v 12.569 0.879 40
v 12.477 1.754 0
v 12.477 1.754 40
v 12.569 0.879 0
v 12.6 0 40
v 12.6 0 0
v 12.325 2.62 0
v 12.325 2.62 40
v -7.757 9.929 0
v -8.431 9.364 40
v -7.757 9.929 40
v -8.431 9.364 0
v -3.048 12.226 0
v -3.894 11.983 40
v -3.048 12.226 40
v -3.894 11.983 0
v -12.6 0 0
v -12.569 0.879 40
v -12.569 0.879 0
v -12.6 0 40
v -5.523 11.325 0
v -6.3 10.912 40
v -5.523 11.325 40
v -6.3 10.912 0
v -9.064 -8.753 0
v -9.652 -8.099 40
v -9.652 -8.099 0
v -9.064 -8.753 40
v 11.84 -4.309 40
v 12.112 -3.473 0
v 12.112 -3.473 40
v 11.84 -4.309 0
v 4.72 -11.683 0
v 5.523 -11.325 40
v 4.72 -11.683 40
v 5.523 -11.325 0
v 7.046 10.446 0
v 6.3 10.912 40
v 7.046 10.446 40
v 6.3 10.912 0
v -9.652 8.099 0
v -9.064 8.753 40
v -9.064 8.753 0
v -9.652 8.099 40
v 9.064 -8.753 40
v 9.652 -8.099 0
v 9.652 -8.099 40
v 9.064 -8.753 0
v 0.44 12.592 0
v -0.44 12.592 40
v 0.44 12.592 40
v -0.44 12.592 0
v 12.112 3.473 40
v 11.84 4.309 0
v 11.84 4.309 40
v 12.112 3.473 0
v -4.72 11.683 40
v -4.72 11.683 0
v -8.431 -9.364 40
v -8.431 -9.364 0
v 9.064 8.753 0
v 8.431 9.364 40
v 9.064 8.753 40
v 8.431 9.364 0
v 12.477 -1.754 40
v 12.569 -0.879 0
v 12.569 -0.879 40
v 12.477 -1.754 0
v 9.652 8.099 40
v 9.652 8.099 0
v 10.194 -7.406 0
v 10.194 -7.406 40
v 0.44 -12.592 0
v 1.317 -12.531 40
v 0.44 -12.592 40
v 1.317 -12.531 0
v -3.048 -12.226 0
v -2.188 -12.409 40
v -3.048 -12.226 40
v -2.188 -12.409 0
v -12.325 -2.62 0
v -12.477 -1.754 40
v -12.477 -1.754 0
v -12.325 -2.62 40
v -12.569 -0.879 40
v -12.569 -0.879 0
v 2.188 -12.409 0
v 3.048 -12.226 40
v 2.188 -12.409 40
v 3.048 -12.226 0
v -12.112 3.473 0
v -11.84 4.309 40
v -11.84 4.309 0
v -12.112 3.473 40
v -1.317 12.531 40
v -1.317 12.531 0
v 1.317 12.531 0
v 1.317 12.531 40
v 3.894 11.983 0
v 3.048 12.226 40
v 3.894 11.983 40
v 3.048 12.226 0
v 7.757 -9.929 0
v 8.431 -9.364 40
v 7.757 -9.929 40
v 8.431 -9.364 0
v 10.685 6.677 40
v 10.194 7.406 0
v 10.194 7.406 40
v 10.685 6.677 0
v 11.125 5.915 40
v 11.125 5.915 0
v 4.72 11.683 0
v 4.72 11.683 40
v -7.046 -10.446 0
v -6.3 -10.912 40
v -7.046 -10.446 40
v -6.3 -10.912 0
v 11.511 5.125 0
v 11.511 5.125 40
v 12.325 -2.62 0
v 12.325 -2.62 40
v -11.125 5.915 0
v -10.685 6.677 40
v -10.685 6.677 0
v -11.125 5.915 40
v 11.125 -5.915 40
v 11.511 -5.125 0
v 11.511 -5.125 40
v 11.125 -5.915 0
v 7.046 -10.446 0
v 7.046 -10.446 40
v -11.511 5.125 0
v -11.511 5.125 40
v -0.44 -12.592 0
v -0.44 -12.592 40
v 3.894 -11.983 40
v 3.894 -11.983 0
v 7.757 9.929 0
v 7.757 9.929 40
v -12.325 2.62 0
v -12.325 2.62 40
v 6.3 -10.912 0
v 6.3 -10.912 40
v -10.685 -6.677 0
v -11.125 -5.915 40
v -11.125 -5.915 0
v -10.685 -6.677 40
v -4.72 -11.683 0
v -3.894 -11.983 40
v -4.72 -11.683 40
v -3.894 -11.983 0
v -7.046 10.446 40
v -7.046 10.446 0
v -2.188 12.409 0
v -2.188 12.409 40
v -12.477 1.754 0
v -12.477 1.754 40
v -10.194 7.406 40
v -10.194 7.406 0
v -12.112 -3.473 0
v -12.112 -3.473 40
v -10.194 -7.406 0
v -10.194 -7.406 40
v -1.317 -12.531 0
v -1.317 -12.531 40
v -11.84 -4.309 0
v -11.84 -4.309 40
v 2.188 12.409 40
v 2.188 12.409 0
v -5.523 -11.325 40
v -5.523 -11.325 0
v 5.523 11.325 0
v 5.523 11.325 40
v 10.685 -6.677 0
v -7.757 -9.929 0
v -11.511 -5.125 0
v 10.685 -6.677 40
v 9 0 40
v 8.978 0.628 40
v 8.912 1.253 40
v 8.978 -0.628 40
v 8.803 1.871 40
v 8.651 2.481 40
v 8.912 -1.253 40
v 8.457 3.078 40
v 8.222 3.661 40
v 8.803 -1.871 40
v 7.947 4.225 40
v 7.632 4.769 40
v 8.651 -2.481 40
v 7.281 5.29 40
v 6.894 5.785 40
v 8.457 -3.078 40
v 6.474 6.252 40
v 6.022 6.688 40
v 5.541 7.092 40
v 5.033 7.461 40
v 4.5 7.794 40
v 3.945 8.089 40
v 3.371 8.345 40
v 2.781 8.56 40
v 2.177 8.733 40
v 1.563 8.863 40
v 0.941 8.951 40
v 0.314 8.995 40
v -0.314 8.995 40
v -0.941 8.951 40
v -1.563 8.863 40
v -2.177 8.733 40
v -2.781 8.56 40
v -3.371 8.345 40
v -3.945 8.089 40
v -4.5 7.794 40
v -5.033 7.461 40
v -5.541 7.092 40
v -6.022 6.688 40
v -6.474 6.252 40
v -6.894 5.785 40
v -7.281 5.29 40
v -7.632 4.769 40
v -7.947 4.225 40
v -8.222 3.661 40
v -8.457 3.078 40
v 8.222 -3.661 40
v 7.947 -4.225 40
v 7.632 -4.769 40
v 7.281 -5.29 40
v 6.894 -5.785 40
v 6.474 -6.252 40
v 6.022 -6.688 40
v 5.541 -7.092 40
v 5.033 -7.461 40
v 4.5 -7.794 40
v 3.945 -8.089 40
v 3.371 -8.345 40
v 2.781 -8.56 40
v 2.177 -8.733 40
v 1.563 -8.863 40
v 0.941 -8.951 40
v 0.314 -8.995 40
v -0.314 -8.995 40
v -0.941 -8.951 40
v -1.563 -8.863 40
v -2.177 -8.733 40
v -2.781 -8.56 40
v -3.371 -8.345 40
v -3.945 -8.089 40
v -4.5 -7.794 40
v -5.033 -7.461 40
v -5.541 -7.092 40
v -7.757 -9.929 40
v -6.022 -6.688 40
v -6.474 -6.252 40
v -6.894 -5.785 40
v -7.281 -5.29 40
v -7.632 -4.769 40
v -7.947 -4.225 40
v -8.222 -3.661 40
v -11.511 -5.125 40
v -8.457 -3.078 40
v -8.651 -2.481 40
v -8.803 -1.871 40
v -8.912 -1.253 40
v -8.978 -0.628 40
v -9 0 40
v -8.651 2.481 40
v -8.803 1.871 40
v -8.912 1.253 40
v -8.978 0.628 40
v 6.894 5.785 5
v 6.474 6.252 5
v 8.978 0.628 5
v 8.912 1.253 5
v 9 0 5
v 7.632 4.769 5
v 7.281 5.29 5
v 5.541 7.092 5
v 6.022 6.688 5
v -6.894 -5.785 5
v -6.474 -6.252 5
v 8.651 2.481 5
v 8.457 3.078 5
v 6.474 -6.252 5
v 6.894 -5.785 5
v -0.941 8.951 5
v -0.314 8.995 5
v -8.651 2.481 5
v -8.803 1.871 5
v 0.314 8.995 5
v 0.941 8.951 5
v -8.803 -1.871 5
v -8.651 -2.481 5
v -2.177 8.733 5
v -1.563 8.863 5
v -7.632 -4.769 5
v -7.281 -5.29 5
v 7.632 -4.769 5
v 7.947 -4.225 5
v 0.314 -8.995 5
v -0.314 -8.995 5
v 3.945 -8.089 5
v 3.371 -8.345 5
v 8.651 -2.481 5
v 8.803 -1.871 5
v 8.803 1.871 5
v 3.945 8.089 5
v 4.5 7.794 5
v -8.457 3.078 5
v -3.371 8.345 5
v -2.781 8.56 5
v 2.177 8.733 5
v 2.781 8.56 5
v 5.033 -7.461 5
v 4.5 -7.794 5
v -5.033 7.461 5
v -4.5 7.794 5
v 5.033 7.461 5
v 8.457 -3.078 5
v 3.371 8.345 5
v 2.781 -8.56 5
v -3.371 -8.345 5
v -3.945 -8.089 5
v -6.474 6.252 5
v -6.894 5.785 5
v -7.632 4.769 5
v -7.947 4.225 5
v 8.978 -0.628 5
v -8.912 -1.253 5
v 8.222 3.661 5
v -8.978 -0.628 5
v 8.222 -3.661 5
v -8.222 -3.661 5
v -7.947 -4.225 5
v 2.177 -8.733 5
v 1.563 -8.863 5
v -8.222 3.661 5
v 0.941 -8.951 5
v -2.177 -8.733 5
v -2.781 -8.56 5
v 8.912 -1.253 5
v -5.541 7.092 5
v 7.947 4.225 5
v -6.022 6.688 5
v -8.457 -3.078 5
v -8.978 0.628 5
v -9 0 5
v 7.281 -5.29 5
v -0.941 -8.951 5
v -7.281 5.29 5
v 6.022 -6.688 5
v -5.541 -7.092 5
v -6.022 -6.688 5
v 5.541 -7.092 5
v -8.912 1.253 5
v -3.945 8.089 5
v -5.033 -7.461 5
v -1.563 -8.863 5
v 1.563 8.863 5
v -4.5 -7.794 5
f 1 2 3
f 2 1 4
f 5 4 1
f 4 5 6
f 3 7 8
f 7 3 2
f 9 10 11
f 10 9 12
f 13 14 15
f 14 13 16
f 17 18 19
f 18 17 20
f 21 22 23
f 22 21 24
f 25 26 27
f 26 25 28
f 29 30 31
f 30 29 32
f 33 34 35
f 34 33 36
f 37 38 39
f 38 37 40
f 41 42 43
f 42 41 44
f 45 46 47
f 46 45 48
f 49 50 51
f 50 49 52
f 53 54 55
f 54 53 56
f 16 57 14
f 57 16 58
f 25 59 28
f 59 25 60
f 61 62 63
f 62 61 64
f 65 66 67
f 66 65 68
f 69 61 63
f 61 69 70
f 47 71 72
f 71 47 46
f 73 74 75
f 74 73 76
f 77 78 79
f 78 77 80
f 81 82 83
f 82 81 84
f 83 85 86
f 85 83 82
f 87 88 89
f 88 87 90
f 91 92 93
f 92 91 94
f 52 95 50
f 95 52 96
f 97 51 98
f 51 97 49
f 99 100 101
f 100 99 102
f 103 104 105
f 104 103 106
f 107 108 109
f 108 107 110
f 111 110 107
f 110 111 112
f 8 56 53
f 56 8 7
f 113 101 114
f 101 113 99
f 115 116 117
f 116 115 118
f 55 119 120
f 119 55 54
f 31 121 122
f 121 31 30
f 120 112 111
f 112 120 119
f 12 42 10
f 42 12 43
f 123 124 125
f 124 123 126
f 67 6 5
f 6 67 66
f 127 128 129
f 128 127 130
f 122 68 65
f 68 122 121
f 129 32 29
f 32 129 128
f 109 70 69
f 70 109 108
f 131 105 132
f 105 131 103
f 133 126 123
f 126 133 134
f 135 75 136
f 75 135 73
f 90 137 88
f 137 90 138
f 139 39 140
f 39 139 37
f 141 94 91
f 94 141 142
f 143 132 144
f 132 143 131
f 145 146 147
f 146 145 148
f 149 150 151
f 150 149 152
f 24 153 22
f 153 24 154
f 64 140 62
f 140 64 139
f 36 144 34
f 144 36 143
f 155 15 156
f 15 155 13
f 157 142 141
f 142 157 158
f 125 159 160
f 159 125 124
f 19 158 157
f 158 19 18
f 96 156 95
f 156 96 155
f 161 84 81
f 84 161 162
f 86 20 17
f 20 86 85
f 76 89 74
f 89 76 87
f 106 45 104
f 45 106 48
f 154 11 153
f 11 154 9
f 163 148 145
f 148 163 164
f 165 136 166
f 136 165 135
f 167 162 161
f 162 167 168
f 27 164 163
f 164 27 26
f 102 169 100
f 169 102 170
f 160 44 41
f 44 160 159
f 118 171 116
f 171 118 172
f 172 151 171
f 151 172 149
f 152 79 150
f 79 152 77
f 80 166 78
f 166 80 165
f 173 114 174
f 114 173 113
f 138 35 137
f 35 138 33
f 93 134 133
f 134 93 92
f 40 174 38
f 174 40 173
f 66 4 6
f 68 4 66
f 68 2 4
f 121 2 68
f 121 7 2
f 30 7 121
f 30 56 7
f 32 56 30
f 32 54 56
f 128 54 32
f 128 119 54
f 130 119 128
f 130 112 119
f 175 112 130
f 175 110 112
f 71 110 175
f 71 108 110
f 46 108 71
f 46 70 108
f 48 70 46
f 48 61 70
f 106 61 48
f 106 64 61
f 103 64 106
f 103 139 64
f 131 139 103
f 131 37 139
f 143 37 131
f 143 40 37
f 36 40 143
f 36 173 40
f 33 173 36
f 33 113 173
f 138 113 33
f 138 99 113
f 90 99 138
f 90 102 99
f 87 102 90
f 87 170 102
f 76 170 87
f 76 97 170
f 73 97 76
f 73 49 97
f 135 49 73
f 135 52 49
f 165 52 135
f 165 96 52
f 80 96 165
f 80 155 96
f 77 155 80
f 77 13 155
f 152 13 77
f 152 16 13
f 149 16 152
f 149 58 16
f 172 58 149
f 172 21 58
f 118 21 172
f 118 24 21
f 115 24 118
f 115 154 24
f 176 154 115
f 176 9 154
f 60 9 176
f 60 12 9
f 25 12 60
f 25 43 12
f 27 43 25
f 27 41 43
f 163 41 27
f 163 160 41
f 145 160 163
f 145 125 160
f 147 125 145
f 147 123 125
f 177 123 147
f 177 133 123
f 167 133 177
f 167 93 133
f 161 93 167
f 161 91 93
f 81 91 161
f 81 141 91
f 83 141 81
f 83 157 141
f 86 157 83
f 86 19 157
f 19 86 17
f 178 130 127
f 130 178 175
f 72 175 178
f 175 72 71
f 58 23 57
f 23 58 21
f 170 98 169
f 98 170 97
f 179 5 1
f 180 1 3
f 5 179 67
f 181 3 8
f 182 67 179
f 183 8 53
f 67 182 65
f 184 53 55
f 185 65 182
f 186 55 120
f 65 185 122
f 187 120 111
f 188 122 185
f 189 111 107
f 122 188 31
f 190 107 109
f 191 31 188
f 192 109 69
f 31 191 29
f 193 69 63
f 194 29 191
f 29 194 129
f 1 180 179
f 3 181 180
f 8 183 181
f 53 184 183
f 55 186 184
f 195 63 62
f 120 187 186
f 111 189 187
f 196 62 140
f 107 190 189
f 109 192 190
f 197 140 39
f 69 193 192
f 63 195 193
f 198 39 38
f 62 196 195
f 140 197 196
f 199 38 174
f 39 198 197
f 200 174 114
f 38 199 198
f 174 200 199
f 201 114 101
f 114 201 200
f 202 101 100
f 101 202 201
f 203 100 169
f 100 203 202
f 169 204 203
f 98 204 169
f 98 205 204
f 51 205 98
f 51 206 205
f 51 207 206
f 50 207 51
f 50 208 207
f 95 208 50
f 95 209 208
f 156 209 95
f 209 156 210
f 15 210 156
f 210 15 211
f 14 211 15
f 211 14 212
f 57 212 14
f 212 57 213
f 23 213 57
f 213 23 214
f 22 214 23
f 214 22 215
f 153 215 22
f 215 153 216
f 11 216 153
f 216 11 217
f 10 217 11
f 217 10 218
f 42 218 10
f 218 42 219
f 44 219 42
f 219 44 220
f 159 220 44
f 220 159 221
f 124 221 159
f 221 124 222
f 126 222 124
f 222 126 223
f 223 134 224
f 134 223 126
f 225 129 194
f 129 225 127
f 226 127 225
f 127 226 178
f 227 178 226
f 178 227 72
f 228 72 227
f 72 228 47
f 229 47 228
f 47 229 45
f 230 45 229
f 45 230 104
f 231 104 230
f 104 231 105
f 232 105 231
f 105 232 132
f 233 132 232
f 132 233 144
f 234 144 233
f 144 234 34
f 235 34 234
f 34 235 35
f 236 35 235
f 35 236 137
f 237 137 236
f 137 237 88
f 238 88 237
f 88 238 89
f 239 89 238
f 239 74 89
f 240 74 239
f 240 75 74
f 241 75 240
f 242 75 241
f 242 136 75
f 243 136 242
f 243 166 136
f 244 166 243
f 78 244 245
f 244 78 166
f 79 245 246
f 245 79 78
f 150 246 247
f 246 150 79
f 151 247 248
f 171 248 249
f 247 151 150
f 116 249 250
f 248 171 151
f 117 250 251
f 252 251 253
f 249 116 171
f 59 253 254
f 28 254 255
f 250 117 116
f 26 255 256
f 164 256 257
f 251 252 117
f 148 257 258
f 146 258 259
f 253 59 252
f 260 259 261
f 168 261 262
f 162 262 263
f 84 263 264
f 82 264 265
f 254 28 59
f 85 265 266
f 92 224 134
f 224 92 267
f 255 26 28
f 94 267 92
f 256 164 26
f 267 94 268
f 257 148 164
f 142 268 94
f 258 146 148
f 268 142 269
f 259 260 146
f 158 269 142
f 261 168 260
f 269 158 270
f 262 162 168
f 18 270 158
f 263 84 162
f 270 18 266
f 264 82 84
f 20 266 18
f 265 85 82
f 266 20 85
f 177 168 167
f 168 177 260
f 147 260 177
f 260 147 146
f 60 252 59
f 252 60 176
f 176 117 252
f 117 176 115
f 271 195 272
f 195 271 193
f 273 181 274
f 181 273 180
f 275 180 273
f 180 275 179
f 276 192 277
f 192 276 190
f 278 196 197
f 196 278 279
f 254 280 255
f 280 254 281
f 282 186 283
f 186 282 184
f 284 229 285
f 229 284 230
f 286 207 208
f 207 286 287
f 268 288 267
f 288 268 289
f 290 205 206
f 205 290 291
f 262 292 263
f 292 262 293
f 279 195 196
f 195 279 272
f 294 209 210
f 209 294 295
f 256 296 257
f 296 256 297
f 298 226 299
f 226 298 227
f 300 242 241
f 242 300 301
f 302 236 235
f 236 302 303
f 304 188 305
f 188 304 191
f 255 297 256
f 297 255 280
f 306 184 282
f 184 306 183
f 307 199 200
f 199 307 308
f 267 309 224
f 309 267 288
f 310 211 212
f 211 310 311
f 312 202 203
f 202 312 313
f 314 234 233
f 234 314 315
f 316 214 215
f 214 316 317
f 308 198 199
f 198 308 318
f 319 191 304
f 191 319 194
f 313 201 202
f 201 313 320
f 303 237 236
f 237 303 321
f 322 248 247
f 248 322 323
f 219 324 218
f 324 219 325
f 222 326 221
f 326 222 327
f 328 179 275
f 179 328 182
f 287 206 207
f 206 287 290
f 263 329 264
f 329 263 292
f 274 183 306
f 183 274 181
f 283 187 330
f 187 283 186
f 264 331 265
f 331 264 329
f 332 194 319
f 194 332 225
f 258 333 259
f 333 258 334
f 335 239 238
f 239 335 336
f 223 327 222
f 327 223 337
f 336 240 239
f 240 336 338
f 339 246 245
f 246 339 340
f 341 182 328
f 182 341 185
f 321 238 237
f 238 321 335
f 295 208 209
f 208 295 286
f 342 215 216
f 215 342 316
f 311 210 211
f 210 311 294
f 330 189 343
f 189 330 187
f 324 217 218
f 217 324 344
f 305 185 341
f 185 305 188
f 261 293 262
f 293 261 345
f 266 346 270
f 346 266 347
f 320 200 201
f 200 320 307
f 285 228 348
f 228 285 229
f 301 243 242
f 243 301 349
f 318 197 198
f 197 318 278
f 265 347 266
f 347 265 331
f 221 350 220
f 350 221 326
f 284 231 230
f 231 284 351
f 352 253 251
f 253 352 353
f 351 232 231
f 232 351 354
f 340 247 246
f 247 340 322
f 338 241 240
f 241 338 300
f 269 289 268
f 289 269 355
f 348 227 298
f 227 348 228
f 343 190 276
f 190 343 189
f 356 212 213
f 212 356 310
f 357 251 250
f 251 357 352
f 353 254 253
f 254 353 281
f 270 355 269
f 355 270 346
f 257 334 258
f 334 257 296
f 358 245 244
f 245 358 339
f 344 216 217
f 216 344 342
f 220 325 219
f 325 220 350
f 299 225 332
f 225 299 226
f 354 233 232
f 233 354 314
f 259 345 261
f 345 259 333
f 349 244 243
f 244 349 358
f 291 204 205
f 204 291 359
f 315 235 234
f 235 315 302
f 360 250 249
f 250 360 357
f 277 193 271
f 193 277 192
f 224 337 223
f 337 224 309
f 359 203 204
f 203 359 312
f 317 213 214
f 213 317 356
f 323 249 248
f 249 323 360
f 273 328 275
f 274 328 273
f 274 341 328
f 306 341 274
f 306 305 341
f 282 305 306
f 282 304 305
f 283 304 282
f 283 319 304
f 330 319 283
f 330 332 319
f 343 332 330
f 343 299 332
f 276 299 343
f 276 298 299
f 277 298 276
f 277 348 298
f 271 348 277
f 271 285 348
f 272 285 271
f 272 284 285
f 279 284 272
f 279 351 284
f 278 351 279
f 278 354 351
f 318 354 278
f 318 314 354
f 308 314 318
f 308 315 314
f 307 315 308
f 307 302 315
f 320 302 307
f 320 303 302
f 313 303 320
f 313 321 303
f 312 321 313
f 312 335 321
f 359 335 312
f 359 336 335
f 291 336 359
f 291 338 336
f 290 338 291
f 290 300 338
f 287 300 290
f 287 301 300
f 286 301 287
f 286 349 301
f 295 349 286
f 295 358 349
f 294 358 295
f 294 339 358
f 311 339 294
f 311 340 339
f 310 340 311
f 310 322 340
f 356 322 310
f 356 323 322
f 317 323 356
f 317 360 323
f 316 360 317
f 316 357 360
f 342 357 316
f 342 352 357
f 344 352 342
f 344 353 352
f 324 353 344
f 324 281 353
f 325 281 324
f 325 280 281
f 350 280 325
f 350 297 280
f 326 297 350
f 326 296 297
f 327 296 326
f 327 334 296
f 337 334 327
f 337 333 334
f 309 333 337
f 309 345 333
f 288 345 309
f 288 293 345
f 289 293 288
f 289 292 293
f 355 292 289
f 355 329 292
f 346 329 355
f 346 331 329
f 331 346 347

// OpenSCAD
H = 40;
$fn = 90;

difference() {
    cylinder(d=25.2, h=H);
    cylinder(d=18, h=H);
}
cylinder(d=25,2, h=5);
